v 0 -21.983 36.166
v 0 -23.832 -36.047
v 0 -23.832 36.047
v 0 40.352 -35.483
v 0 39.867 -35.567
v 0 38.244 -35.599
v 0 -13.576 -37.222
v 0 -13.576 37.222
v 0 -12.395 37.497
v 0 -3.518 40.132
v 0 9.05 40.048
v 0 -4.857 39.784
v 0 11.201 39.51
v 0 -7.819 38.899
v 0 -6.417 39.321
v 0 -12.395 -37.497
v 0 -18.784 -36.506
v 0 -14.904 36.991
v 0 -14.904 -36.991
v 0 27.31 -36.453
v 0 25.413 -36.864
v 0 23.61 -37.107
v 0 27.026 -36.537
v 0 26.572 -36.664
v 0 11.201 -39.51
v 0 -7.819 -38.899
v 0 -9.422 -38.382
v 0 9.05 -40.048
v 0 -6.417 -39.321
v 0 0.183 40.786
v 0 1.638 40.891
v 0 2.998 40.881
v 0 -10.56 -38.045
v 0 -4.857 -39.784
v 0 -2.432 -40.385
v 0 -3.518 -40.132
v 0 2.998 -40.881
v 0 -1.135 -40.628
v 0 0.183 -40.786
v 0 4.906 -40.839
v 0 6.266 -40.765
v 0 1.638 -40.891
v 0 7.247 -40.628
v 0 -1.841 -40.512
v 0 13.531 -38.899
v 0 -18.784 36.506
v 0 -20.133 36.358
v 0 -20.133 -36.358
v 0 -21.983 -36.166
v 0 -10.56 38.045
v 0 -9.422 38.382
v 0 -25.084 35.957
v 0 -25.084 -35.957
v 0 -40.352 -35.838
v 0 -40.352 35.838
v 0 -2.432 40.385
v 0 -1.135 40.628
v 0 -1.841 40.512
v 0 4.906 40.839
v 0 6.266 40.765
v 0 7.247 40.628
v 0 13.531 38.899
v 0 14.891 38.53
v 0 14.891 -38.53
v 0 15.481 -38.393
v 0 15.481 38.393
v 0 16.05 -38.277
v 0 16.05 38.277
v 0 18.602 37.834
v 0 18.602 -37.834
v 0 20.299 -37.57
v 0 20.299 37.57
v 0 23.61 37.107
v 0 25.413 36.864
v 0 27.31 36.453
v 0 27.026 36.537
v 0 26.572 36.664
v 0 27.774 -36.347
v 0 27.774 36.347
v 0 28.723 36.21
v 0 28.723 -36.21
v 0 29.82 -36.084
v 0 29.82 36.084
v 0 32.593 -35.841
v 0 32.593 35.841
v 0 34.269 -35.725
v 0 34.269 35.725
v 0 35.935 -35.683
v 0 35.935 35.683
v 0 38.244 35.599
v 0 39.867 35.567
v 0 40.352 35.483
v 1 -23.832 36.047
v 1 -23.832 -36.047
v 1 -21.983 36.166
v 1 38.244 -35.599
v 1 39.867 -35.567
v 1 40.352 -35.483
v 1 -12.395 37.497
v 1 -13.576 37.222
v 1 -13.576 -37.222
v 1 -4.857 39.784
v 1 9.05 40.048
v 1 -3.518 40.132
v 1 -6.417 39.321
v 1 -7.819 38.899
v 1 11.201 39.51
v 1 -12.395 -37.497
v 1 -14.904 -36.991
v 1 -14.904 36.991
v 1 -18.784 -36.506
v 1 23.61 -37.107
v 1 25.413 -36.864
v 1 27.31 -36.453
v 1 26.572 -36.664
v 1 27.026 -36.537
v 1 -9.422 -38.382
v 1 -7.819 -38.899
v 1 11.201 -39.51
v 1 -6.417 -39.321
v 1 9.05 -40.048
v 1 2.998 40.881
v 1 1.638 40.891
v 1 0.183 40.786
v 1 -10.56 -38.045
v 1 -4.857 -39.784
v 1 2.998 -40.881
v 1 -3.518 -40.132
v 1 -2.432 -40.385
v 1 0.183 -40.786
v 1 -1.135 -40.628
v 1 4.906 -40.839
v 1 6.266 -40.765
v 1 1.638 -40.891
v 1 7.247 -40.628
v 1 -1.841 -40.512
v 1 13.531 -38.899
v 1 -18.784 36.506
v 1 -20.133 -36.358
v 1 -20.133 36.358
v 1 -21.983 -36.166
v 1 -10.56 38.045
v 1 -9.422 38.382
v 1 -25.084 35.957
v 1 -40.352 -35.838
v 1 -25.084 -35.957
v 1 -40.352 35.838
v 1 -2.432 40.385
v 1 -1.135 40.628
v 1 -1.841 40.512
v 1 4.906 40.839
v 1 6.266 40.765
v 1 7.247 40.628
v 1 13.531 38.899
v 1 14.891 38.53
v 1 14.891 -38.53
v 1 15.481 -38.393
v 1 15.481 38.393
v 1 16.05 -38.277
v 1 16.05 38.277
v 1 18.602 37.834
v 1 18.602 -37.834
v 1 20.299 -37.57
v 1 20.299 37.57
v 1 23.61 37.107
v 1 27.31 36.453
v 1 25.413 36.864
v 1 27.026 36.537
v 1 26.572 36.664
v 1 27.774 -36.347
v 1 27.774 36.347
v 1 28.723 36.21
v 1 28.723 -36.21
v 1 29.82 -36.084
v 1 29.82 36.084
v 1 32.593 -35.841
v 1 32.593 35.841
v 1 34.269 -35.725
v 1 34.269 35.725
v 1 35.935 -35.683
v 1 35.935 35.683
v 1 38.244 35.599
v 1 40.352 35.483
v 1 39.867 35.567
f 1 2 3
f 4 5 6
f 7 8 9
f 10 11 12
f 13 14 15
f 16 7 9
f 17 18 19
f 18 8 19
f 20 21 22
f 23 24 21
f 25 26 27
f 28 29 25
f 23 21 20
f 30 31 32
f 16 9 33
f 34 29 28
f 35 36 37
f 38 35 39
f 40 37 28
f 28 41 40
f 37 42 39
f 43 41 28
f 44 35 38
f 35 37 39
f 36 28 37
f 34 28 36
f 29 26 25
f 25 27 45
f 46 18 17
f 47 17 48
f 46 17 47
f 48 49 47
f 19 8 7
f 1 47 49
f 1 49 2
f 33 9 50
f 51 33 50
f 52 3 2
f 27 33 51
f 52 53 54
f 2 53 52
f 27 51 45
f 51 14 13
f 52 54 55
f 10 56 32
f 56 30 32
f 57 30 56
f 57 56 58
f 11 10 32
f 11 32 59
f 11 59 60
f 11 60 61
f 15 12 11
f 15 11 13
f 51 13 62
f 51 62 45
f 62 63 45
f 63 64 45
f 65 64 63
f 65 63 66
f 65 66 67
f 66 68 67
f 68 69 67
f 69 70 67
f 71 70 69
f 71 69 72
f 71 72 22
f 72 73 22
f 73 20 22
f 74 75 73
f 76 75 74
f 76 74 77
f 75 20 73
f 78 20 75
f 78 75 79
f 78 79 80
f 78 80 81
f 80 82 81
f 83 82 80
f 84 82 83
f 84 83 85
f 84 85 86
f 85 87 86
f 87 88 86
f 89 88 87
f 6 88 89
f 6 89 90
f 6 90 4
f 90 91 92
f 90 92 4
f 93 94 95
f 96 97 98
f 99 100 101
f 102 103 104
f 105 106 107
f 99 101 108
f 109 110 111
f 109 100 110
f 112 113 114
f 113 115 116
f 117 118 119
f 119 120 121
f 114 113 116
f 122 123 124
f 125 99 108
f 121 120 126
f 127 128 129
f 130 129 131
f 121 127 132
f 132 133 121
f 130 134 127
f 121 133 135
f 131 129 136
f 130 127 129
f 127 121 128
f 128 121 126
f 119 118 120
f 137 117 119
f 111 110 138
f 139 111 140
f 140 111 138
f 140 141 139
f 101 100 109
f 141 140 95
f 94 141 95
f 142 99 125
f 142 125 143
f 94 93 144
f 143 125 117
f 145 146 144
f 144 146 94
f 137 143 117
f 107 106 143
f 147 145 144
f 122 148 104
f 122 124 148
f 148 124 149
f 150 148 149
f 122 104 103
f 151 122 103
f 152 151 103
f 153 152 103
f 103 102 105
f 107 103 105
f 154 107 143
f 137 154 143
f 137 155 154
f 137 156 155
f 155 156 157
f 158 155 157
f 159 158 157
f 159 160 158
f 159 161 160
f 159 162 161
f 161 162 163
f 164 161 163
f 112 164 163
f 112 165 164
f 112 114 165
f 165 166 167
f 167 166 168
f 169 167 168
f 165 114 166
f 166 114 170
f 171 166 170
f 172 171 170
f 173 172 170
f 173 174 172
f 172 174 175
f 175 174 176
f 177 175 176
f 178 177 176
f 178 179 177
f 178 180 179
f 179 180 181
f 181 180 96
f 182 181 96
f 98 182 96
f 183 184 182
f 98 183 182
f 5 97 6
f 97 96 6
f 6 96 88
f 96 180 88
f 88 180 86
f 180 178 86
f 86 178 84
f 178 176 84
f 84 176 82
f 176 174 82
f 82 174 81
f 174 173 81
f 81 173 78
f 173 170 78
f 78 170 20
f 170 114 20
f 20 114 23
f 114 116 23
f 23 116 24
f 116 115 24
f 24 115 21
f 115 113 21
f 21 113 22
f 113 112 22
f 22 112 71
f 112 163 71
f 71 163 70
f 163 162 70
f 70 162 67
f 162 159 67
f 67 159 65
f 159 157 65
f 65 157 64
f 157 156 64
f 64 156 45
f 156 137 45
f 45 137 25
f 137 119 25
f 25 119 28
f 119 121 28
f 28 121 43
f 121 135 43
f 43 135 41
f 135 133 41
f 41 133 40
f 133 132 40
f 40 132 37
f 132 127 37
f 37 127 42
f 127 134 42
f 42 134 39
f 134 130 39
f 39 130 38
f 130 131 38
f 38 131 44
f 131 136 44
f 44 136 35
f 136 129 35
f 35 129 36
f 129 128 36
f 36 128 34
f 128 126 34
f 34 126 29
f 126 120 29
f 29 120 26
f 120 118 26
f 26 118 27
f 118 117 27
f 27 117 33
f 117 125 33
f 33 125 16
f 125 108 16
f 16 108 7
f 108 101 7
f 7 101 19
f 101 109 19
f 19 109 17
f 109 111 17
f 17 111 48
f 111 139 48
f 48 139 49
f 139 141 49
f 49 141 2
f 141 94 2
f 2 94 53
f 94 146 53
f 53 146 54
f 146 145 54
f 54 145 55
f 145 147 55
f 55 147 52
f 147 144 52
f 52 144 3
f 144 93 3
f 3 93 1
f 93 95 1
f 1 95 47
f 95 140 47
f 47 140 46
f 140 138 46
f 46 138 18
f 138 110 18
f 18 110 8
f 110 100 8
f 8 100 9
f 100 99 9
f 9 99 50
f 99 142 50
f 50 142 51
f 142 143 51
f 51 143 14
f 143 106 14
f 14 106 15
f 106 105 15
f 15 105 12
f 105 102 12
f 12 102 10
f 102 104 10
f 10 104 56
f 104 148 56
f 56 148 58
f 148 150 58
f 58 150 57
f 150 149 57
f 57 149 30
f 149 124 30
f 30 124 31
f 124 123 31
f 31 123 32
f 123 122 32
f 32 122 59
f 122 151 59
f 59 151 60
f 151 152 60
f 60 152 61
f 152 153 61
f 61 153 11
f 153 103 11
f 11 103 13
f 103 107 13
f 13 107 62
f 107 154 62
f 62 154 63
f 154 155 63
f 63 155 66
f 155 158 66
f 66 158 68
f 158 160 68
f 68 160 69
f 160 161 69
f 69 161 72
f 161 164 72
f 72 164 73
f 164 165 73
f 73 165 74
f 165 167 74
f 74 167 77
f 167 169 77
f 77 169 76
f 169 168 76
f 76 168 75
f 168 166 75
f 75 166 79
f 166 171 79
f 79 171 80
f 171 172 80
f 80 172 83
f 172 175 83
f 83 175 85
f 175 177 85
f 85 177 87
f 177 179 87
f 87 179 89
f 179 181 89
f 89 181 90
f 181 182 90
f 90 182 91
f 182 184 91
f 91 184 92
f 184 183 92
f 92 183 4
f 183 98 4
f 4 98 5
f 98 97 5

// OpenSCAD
// Module names are of the form poly_<inkscape-path-id>().  As a result,
// you can associate a polygon in this OpenSCAD program with the corresponding
// SVG element in the Inkscape document by looking for the XML element with
// the attribute id="inkscape-path-id".

// fudge value is used to ensure that subtracted solids are a tad taller
// in the z dimension than the polygon being subtracted from.  This helps
// keep the resulting .stl file manifold.
fudge = 0.1;

module palm_profile(h)
{
  rotate([0,90,0])
  scale([25.4/90, -25.4/90, 1]) union()
  {
    linear_extrude(height=h)
      polygon([[-126.003755,-142.822125],[125.871825,-142.822125]]);
    linear_extrude(height=h)
      polygon([[125.726715,-142.980545],[126.025575,-141.262105],[126.137645,-135.509065],[126.436505,-127.327785],[126.585925,-121.425315],[126.996865,-115.485485],[127.856085,-105.660485],[128.304375,-101.775305],[128.790015,-98.413145],[129.163595,-96.769415],[129.462455,-95.760765],[129.910745,-94.154395],[130.620535,-90.045085],[131.479755,-83.656955],[133.123485,-71.926725],[134.057405,-65.912185],[135.626415,-56.871685],[136.037345,-54.854385],[136.523005,-52.762365],[137.830505,-47.943265],[139.997235,-39.687265],[141.902465,-32.066355],[143.957125,-25.678235],[144.442765,-22.203995],[144.704265,-17.384895],[144.853715,-10.623195],[144.891015,-5.804085],[144.517445,-0.648765],[143.957075,4.020915],[143.546145,6.523855],[143.097855,8.615875],[142.201285,12.463695],[140.968485,17.208085],[139.324755,22.736985],[137.830465,27.705525],[135.999955,33.383845],[134.804505,37.418445],[132.861925,43.918645],[131.890635,48.102675],[131.068765,52.809705],[129.350325,66.557245],[128.827325,71.338995],[128.146955,77.892295],[127.724295,84.443385],[127.407305,88.881215],[126.984655,142.980545],[-126.984655,142.980545],[-127.407295,88.881215],[-127.724295,84.443385],[-128.146945,77.892295],[-128.827315,71.338995],[-129.350315,66.557245],[-131.068765,52.809705],[-131.890625,48.102675],[-132.861915,43.918645],[-134.804505,37.418445],[-135.999945,33.383845],[-137.830455,27.705525],[-139.324755,22.736985],[-140.968485,17.208085],[-142.201275,12.463695],[-143.097855,8.615875],[-143.546145,6.523855],[-143.957075,4.020915],[-144.517435,-0.648765],[-144.891015,-5.804085],[-144.853715,-10.623195],[-144.704285,-17.384895],[-144.442785,-22.203995],[-143.957135,-25.678235],[-141.902475,-32.066355],[-139.997245,-39.687265],[-137.830515,-47.943265],[-136.523005,-52.762365],[-136.037365,-54.854385],[-135.626435,-56.871685],[-134.057415,-65.912185],[-133.123485,-71.926725],[-131.479755,-83.656955],[-130.620535,-90.045085],[-129.910745,-94.154395],[-129.462455,-95.760765],[-129.163595,-96.769415],[-128.790025,-98.413145],[-128.304375,-101.775305],[-127.856085,-105.660485],[-126.996865,-115.485485],[-126.585935,-121.425315],[-126.436505,-127.327785],[-126.137645,-135.509065],[-126.025575,-141.262105],[-125.726715,-142.980545]]);
  }
}

palm_profile(1);
